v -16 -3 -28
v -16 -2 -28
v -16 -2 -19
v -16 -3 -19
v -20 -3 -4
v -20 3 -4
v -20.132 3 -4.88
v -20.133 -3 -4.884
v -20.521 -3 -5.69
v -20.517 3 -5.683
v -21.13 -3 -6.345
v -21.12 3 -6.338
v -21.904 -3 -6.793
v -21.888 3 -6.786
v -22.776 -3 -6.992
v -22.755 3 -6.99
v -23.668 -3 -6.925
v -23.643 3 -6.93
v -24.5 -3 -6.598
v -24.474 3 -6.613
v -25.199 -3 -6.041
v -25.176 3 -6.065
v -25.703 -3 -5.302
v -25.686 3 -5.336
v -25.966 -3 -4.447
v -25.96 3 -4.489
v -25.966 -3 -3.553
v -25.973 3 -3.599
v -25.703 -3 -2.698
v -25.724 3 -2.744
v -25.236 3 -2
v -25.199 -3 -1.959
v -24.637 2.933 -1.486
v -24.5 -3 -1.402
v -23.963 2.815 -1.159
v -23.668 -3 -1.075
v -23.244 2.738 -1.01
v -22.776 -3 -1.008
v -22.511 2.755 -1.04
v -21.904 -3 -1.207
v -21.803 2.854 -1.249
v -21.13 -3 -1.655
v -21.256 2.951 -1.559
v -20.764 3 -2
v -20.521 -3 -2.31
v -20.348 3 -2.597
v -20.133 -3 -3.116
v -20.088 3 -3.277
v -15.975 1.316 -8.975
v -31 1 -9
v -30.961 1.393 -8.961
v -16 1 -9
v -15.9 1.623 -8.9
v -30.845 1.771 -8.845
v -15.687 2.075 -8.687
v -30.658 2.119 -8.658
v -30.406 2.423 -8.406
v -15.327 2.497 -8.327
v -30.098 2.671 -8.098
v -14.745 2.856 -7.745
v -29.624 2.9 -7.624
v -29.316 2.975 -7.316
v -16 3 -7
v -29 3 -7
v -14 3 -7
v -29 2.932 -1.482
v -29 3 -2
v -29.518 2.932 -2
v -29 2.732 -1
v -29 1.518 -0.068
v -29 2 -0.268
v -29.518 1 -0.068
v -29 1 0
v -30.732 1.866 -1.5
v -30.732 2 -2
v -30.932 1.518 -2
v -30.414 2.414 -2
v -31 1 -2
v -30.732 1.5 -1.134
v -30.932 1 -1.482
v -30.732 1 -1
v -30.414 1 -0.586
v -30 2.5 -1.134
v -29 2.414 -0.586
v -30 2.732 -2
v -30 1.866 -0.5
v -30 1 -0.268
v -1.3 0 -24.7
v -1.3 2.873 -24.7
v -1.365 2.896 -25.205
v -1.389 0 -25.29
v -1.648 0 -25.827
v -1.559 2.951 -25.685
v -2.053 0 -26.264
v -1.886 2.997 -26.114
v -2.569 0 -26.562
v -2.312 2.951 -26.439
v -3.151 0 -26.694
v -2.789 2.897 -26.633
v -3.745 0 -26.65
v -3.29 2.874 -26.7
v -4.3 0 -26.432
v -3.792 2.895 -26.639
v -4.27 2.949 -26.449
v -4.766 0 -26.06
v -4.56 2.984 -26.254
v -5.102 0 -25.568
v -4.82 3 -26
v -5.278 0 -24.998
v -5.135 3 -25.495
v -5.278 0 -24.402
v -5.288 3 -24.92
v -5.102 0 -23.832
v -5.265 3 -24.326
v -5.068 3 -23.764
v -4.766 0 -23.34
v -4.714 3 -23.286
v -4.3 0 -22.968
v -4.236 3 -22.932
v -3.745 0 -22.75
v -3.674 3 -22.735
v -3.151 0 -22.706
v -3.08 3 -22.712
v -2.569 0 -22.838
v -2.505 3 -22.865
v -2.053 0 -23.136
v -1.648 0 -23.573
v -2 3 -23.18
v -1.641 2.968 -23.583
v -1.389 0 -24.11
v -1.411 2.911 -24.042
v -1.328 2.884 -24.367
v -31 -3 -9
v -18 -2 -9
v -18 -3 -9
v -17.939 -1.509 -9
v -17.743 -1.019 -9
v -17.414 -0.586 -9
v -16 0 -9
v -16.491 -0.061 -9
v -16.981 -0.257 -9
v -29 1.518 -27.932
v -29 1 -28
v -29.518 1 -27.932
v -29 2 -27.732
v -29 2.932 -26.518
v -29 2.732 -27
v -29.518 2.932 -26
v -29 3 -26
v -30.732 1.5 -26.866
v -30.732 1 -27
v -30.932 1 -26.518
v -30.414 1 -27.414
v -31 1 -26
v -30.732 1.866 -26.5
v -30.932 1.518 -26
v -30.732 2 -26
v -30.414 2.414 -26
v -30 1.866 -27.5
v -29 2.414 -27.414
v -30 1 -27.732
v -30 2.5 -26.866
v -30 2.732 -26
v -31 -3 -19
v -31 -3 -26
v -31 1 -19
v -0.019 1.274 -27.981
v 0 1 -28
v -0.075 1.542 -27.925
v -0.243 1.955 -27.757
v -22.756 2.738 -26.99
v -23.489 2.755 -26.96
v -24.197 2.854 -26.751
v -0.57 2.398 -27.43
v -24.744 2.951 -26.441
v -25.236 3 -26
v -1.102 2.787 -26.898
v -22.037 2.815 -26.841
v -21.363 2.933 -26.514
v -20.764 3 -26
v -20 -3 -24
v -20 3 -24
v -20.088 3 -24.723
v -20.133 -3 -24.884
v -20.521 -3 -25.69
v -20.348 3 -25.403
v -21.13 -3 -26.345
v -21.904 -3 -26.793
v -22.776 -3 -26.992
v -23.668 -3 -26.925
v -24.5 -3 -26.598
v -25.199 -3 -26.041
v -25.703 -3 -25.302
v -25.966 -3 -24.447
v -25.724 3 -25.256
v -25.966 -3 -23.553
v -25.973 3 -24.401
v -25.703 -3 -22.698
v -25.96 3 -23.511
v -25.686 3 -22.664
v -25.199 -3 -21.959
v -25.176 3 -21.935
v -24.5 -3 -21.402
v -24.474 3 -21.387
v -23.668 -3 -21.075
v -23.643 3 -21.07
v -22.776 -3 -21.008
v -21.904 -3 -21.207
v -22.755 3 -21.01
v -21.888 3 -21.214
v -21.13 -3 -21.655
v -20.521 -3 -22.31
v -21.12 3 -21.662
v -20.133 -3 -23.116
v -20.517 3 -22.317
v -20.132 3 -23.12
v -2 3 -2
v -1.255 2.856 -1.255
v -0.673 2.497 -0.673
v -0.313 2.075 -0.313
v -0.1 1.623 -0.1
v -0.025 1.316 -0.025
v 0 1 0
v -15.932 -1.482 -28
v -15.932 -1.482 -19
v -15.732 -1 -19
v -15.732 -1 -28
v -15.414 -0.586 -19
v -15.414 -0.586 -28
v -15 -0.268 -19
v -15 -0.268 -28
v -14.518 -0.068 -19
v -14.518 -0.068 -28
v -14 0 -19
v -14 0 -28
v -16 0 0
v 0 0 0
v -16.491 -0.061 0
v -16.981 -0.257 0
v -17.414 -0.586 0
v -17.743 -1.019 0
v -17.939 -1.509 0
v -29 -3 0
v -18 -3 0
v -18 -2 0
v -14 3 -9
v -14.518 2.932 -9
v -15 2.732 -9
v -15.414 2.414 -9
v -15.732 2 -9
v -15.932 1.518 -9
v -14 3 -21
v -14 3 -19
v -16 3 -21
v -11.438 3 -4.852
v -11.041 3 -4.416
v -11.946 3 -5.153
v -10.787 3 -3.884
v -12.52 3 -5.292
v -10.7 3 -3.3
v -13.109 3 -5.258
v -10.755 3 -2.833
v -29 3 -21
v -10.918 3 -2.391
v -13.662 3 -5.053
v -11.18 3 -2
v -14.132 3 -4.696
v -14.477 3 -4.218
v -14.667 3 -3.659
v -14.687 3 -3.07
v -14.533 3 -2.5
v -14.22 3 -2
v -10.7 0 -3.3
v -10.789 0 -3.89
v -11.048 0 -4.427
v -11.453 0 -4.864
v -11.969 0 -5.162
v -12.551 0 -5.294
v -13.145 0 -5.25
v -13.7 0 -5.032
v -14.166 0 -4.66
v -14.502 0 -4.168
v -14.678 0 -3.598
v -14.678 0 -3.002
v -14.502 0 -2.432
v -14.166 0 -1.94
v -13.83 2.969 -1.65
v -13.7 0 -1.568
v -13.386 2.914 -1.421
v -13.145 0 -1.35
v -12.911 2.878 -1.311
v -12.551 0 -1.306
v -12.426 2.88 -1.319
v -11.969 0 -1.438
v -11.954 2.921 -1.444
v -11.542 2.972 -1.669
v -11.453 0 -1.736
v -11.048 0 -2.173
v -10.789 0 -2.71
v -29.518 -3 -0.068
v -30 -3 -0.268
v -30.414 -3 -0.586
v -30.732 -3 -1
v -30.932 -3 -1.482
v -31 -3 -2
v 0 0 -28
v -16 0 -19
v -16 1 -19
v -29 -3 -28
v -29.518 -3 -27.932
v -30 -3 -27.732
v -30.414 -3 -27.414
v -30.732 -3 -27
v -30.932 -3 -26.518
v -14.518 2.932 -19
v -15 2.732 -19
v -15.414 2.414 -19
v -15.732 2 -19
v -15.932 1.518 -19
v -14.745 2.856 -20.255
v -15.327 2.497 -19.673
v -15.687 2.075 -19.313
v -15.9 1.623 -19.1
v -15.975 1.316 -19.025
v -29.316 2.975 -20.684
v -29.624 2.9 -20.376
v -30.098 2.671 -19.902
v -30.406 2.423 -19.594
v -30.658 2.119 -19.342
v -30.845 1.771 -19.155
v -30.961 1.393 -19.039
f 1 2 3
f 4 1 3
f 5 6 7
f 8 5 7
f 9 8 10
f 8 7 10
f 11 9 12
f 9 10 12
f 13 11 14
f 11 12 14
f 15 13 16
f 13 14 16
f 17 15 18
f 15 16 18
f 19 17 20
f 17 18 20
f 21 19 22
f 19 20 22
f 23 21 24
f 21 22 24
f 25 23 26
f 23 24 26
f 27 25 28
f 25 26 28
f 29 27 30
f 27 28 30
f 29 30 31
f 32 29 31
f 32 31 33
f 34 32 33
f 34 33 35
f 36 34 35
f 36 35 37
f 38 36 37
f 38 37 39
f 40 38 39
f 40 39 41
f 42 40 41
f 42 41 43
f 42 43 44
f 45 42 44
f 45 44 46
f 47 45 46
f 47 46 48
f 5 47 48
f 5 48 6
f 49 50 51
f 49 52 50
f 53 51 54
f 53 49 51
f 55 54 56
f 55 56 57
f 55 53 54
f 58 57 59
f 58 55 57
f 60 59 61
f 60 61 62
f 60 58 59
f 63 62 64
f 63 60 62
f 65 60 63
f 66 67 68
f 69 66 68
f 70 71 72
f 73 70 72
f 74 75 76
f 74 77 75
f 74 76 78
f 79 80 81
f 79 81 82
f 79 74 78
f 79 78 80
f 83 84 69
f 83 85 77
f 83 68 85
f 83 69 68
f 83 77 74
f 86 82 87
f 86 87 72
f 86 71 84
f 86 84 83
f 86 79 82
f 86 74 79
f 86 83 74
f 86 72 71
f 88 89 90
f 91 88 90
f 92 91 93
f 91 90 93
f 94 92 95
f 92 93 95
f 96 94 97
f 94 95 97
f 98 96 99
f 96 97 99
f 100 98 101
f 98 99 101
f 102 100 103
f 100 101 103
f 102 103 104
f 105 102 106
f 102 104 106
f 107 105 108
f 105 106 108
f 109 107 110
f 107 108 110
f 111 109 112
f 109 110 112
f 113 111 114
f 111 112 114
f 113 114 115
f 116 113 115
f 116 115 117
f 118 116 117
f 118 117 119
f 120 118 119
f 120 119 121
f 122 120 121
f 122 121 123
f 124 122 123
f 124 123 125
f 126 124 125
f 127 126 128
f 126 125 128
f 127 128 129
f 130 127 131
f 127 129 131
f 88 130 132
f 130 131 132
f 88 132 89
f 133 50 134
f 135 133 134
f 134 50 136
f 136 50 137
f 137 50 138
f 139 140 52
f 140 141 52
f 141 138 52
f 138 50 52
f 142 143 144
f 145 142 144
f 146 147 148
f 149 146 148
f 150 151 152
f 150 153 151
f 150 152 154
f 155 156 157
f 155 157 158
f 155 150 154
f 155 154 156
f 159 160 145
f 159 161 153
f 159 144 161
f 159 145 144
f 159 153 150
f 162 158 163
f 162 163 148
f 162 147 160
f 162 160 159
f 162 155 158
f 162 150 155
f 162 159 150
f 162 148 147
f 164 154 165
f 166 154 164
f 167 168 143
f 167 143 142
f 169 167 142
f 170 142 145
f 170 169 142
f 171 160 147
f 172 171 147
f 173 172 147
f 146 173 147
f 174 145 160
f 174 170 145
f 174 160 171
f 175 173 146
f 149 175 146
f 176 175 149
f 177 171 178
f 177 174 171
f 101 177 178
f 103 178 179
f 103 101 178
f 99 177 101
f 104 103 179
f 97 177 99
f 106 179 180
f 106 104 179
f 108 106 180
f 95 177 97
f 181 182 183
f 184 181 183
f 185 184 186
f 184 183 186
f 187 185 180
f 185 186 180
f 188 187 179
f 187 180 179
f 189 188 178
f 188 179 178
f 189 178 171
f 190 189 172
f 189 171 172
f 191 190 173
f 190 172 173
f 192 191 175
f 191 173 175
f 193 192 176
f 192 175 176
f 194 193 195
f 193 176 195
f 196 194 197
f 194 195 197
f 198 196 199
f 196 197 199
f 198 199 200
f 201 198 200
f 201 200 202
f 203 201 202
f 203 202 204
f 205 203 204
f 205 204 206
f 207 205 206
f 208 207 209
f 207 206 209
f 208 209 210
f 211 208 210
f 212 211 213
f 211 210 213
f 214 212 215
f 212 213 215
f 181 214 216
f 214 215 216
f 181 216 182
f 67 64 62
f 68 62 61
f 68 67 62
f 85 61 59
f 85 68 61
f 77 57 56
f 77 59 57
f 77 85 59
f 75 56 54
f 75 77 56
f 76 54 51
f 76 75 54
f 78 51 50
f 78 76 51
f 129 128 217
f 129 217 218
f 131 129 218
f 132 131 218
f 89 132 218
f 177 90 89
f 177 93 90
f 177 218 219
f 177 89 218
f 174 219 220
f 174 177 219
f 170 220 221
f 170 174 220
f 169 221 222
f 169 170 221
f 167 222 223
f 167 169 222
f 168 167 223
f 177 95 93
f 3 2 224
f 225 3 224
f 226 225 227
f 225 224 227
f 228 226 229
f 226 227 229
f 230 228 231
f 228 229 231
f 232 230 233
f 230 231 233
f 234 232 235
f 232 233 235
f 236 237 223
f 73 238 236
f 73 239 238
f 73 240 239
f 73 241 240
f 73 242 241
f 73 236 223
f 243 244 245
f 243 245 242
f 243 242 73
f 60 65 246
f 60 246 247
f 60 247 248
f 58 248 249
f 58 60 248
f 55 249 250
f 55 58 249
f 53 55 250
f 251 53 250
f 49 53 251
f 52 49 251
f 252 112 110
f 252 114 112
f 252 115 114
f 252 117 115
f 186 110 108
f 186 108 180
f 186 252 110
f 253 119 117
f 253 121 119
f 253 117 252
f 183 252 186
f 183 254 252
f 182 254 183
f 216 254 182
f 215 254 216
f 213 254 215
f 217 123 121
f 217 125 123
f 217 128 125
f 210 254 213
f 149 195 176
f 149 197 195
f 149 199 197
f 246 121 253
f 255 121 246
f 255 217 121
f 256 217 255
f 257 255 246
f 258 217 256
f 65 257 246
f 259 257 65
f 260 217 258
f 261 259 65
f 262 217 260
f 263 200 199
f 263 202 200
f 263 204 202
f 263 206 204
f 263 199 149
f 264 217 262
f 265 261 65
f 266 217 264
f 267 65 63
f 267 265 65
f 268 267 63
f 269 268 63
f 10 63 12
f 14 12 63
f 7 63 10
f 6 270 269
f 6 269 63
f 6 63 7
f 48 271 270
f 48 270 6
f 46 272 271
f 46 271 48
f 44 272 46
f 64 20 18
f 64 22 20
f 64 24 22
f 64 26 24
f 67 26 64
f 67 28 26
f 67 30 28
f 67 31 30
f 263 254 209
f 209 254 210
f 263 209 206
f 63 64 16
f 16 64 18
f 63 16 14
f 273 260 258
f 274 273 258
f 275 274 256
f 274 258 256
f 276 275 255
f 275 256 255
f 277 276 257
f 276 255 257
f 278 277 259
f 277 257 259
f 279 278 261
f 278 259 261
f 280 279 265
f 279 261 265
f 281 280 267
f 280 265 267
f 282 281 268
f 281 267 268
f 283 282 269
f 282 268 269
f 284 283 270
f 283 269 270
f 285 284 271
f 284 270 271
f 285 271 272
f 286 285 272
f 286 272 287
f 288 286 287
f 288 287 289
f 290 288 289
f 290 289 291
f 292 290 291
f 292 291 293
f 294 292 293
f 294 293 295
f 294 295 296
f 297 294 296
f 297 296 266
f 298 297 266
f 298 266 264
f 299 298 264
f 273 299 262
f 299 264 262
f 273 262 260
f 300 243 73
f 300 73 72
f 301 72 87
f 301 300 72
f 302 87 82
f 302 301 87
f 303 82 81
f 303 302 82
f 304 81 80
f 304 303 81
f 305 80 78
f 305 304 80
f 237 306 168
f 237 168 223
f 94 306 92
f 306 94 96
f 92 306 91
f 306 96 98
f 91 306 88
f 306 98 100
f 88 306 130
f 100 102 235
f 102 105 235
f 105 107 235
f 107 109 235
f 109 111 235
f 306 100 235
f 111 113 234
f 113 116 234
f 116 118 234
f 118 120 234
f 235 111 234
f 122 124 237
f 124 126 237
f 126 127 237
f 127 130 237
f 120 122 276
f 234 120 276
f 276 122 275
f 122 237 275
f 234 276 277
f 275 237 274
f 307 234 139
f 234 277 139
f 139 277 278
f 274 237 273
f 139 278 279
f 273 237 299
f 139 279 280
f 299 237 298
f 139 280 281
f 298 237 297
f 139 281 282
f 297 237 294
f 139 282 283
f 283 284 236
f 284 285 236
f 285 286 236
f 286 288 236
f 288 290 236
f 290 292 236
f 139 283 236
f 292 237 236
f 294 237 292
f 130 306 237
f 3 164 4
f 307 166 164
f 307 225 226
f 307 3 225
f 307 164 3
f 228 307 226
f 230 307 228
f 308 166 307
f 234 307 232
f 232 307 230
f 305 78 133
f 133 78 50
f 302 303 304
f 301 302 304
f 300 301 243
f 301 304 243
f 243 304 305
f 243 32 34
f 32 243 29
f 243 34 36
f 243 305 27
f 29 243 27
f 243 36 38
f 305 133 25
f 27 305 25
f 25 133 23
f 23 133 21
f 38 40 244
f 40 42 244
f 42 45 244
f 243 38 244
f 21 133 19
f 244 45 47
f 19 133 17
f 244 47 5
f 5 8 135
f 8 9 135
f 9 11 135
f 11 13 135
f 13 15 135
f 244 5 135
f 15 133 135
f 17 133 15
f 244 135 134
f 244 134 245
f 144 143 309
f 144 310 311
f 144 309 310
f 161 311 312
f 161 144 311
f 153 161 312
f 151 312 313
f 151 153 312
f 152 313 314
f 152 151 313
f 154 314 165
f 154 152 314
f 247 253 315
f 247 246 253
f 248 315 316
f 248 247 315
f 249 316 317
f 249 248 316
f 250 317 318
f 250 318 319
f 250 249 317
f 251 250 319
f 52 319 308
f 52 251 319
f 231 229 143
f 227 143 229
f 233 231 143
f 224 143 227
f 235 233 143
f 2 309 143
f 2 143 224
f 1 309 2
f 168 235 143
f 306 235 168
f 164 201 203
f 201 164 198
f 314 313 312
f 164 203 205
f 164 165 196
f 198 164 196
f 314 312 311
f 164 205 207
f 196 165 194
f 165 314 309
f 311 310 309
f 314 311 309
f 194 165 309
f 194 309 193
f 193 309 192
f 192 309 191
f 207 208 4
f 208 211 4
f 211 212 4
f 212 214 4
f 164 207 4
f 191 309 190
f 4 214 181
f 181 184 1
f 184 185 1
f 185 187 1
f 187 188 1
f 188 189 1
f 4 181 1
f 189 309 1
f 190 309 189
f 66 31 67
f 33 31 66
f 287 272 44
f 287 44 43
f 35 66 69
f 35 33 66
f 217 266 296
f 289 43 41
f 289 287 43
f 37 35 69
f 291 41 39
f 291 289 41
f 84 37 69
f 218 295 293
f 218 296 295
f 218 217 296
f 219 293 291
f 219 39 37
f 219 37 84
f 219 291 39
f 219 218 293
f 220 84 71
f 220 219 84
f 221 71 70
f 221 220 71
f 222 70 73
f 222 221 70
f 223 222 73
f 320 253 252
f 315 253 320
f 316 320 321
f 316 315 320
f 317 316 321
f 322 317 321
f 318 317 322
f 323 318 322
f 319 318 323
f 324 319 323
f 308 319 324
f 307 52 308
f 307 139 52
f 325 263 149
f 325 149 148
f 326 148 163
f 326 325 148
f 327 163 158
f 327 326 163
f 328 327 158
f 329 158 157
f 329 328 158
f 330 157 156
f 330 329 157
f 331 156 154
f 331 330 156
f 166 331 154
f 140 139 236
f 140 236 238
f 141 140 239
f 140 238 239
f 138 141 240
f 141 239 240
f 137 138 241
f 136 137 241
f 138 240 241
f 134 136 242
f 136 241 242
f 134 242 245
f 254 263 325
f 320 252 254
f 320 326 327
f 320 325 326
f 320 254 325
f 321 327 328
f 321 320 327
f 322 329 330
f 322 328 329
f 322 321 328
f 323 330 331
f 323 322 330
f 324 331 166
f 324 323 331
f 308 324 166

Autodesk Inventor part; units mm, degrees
ref_plane "YZ Plane" through (0, 0, 0) normal (1, 0, 0) x (0, 1, 0)
ref_plane "XZ Plane" through (0, 0, 0) normal (0, 1, 0) x (-1, 0, 0)
ref_plane "XY Plane" through (0, 0, 0) normal (0, 0, 1) x (1, 0, 0)
sketch "Sketch1" plane through (0, 0, 0) normal (0, 1, 0) x (-1, 0, 0)
  line L0 (0, 0) -> (16, 0)
  line L1 (16, 0) -> (16, -28)
  line L2 (16, -28) -> (0, -28)
  line L3 (0, -28) -> (0, 0)
  dimension "d0" = 16
  dimension "d1" = 28
extrude "Extrusion1" add sketch "Sketch1" along normal blind 3
sketch "Sketch2" plane through (0, 3, 0) normal (0, 1, 0) x (1, 0, 0)
  circle A0 centre (-3.3, 24.7) radius 2
  circle A1 centre (-12.7, 3.3) radius 2
  line L0 (0, 28) -> (-16, 28) projected
  line L1 (0, 0) -> (0, 28) projected
  line L2 (-16, 28) -> (-16, 0) projected
  line L3 (-16, 0) -> (0, 0) projected
  dimension "d4" = 4
  dimension "d5" = 4
  dimension "d6" = 3.3
  dimension "d7" = 3.3
  dimension "d8" = 3.3
  dimension "d9" = 3.3
extrude "Extrusion2" cut sketch "Sketch2" against normal blind 3.3 contours A0 | A1
sketch "Sketch10" plane through (0, 3, 0) normal (0, 1, 0) x (1, 0, 0)
  line L0 (-16, 28) -> (-16, 0) projected
  line L1 (-16, 14) -> (-16, 4)
  line L2 (-16, 4) -> (-24, 4)
  line L3 (-16, 0) -> (0, 0) projected
  line L4 (-16, 0) -> (-31, 0)
  line L5 (-31, 0) -> (-31, 9)
  line L6 (-31, 9) -> (-16, 9)
  line L7 (-16, 9) -> (-16, 0)
  line L8 (0, 28) -> (-16, 28) projected
  line L9 (-16, 28) -> (-31, 28)
  line L10 (-31, 28) -> (-31, 19)
  line L11 (-31, 19) -> (-16, 19)
  line L12 (-16, 19) -> (-16, 28)
  dimension "d52" = 10
  dimension "d53" = 8
  dimension "d54" = 15
  dimension "d55" = 9
  dimension "d56" = 15
  dimension "d57" = 9
extrude "Extrusion9" add sketch "Sketch10" against normal blind 6
sketch "Sketch11" plane through (0, 3, 0) normal (0, 1, 0) x (1, 0, 0)
  circle A0 centre (-23, 4) radius 3
  circle A1 centre (-23, 24) radius 3
  line L0 (-31, 0) -> (0, 0) projected
  line L1 (-31, 9) -> (-31, 0) projected
  line L2 (-31, 28) -> (-31, 19) projected
  dimension "d60" = 6
  dimension "d61" = 6
  dimension "d62" = 4
  dimension "d63" = 20
  dimension "d64" = 8
  dimension "d65" = 8
extrude "Extrusion10" cut sketch "Sketch11" against normal through all
sketch "Sketch12" plane through (0, -3, 0) normal (0, -1, 0) x (1, 0, 0)
  line L0 (-16, -9) -> (-31, -9) projected
  line L1 (-16, -9) -> (-18, -9)
  line L2 (-18, -9) -> (-18, 0)
  line L3 (-18, 0) -> (-16, 0)
  line L4 (-16, 0) -> (-16, -9)
  point P0 (0, 0)
  dimension "d68" = 2
  dimension "d69" = 9
extrude "Extrusion11" cut sketch "Sketch12" against normal blind 3
fillet "Fillet1" radius 2 2 edges at (-16, 0, -23.5) (-18, 0, -4.5)
fillet "Fillet2" radius 2 3 edges at (-15.5, 3, 0) (0, 3, -14) (-15.5, 3, -28)
fillet "Fillet3" radius 2 8 edges at (-31, 2.4142, -27.4142) (-31, -1, -28) (-31, 3, -22.5) (-23.5, 3, -19) (-23.5, 3, -9) (-31, 2.4142, -0.5858) (-31, -1, 0) (-31, 3, -5.5)
fillet "Fillet4" radius 2 2 edges at (-16, 3, -8) (-16, 3, -20)
equation "\"d10\" = d7"
properties part number "Limit_SwitchMount"
